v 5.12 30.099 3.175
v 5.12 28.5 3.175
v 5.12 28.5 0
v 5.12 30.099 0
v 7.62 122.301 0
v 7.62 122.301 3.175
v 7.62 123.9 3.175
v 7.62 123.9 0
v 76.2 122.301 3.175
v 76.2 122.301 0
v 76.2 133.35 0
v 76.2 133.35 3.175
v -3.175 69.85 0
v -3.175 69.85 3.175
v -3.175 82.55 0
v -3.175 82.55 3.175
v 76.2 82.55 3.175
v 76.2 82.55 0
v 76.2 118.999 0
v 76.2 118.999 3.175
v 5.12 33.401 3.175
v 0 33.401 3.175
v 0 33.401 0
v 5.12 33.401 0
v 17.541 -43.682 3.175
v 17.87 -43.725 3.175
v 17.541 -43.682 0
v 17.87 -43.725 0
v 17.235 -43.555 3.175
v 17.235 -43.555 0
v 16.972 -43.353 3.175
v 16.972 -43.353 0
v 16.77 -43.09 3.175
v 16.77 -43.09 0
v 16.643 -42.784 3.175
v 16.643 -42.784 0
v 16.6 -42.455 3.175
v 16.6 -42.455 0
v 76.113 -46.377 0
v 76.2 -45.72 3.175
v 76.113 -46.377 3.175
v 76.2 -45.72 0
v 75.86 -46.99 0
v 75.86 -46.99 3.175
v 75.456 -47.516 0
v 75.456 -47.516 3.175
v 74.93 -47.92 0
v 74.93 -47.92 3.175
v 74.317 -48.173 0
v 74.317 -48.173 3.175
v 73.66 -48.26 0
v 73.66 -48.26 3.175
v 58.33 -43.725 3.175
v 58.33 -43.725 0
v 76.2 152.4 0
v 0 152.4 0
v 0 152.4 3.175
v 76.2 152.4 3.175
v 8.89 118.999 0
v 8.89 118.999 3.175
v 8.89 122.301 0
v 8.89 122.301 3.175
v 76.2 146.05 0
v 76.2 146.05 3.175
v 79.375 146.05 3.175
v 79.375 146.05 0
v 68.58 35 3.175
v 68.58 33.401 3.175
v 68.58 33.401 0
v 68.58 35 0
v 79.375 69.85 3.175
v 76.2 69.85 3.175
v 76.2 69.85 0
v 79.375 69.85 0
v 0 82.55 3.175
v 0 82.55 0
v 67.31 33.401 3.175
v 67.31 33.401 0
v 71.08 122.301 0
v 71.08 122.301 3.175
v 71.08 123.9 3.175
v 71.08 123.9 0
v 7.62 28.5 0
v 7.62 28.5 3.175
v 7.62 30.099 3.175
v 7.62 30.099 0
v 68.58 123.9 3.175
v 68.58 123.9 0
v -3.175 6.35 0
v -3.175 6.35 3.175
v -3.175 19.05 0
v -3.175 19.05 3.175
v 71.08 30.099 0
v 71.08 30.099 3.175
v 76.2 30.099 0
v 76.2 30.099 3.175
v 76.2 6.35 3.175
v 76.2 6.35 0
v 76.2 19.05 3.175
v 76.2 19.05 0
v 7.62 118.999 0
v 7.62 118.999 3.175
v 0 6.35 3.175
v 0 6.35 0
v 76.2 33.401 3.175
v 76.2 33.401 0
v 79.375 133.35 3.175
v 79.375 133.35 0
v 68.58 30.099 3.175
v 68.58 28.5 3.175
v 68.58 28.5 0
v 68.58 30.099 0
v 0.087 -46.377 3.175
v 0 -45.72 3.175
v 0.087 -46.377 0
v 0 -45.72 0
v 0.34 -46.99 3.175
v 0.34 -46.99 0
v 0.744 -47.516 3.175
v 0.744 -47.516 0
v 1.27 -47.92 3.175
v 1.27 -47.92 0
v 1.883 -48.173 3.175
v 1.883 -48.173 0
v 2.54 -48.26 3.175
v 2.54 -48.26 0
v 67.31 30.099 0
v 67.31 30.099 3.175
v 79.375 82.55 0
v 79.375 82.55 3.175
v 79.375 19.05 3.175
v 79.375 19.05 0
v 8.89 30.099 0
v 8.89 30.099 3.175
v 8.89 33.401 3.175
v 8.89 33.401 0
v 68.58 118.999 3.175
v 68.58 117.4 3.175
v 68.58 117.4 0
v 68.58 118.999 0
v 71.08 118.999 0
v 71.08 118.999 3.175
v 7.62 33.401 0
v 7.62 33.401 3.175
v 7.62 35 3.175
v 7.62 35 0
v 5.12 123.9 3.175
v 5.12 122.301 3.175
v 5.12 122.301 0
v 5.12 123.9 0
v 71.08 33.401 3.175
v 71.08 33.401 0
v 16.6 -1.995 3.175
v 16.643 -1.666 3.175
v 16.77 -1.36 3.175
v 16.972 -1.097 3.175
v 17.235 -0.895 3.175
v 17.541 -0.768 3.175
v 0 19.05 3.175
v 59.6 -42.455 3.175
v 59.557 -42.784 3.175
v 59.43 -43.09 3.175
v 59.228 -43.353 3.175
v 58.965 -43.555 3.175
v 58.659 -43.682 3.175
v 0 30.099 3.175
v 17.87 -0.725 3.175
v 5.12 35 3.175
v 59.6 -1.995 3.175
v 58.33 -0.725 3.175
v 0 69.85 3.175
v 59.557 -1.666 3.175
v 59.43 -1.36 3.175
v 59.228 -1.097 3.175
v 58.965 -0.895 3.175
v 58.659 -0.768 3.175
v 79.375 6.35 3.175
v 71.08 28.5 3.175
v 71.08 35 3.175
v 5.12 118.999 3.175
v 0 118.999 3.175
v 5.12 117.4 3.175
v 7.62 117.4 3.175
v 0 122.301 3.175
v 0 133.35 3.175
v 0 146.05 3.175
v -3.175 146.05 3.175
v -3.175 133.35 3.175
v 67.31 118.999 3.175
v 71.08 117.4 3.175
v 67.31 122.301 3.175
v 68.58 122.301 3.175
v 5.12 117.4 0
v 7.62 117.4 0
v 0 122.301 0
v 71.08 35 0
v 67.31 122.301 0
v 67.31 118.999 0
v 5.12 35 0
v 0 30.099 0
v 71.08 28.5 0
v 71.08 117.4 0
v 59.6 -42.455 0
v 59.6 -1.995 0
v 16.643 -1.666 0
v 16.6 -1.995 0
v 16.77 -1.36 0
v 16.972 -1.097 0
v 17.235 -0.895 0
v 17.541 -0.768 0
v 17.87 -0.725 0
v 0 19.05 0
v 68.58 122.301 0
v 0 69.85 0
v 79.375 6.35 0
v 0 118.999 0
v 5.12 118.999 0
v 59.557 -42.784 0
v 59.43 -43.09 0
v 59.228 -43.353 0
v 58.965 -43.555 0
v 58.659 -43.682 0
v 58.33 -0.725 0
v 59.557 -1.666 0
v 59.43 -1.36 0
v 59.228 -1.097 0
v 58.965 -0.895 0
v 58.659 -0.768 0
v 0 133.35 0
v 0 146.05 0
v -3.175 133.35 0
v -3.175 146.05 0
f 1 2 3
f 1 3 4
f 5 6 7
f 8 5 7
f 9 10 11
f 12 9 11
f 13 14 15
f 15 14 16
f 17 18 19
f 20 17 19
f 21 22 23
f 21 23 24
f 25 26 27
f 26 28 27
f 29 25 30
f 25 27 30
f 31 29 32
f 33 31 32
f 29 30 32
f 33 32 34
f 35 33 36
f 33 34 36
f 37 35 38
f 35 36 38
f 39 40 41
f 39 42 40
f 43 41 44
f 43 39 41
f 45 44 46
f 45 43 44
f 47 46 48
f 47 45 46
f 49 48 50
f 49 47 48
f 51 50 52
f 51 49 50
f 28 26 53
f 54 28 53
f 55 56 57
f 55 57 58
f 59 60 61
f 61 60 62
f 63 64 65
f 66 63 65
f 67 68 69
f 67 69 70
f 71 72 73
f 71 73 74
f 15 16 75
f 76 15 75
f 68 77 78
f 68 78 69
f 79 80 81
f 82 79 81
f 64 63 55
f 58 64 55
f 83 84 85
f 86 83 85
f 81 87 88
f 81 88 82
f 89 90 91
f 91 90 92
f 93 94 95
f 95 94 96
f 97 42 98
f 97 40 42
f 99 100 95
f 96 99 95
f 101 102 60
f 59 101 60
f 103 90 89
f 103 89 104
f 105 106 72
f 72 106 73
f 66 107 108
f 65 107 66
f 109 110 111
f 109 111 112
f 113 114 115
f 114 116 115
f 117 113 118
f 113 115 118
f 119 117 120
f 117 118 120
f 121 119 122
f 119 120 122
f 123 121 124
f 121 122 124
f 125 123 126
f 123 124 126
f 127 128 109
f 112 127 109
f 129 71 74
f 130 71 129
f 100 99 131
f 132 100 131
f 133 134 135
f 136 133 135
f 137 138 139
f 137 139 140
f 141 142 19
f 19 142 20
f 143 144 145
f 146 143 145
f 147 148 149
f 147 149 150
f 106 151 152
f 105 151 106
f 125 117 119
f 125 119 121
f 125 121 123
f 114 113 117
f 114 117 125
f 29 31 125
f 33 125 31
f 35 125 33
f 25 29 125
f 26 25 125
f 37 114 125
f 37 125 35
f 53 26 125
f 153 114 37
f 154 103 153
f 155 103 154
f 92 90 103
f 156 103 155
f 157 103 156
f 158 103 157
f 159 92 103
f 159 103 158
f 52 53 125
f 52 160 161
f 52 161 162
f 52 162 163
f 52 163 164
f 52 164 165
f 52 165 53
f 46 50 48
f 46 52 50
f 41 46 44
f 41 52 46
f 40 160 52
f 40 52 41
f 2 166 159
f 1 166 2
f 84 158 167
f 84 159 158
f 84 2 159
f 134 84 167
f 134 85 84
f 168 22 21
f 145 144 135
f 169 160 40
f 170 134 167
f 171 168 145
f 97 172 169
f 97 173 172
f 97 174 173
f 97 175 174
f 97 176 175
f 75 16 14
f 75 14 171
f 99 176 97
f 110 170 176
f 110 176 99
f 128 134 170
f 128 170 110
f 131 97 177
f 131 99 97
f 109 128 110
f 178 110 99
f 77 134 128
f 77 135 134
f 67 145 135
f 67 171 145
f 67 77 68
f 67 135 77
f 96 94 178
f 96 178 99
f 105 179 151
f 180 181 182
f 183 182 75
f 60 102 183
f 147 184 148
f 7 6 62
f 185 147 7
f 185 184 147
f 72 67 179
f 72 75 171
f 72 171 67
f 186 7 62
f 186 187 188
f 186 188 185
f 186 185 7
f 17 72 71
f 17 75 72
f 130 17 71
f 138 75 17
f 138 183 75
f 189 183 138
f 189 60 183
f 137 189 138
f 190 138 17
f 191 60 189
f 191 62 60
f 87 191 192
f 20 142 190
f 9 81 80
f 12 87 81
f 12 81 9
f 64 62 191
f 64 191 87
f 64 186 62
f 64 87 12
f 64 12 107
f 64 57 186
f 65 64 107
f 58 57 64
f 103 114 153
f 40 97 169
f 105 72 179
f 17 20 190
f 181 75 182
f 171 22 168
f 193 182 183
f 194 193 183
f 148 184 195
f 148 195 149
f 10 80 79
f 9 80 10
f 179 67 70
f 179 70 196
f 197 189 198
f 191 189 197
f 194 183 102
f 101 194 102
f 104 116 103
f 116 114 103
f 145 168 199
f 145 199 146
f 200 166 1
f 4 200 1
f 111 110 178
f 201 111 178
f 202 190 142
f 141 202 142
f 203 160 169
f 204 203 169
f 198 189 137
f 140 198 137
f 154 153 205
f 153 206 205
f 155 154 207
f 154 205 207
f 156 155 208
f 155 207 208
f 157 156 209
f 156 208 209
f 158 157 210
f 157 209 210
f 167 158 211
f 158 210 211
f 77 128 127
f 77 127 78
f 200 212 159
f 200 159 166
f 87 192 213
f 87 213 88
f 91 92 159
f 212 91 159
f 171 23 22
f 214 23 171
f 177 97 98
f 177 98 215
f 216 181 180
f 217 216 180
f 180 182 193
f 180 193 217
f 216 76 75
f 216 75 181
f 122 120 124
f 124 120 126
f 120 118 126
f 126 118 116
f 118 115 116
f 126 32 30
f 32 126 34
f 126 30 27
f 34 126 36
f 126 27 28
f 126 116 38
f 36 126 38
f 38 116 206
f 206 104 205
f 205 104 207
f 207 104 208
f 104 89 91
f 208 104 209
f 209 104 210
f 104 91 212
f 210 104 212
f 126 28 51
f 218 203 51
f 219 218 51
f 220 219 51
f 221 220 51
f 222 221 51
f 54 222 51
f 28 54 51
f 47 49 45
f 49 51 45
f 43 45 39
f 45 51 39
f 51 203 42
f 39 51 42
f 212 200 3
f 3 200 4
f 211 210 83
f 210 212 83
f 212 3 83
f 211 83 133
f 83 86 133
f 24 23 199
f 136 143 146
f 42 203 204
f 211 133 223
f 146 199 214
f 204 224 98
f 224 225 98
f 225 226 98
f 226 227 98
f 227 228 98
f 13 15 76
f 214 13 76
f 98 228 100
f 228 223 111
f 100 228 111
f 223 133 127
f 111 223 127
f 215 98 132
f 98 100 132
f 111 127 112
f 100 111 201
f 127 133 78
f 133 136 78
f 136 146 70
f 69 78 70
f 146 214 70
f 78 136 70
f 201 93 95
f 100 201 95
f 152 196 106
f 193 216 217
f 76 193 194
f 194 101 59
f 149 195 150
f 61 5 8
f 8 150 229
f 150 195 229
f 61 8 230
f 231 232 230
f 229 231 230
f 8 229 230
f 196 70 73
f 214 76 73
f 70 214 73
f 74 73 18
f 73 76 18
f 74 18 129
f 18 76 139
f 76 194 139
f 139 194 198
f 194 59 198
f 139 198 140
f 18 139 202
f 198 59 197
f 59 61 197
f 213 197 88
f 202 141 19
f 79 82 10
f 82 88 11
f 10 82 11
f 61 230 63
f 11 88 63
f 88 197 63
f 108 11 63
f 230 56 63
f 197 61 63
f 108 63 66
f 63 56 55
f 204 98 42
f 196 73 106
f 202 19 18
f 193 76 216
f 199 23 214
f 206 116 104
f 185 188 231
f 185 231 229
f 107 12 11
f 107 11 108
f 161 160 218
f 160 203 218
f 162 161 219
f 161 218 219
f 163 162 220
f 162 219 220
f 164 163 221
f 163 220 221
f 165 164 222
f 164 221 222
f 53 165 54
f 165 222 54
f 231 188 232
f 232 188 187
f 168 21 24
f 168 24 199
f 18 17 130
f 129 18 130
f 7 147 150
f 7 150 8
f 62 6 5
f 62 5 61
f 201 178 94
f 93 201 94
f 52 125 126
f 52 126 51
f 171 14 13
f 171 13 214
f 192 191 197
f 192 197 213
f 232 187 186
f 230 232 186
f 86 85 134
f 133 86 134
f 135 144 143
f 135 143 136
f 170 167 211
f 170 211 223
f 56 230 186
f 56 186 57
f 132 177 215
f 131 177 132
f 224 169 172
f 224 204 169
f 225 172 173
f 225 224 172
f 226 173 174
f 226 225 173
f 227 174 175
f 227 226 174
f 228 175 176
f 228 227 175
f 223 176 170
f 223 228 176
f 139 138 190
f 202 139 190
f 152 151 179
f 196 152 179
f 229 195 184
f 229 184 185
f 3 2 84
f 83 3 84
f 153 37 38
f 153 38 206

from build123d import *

# Parameters (mm, degrees)
SKETCH1_W           = 76.2
SKETCH1_H           = 152.4
BOSS_EXTRUDE1_DEPTH = 3.175
SKETCH2_W           = 3.175
SKETCH2_H           = 12.7
BOSS_EXTRUDE3_DEPTH = 3.175
SKETCH4_W           = 8.89
SKETCH4_H           = 3.302
SKETCH4_W_2         = 2.5
SKETCH4_H_2         = 6.5
CUT_EXTRUDE4_DEPTH  = 3.175
SKETCH5_W           = 76.2
SKETCH5_H           = 44.45
SKETCH5_W_2         = 43
SKETCH5_H_2         = 43
BOSS_EXTRUDE4_DEPTH = 3.175
SKETCH7_W           = 76.2
SKETCH7_H           = 3.81
BOSS_EXTRUDE5_DEPTH = 3.175
FILLET1_R           = 2.54
FILLET2_R           = 1.27


with BuildPart() as part:
    # Sketch1 → Boss-Extrude1 (new body)
    with BuildSketch(Plane.XY):
        with Locations((38.1, 76.2)):
            Rectangle(SKETCH1_W, SKETCH1_H)
    extrude(amount=BOSS_EXTRUDE1_DEPTH)

    # Sketch2 → Boss-Extrude3 (add)
    with BuildSketch(Plane.XY.offset(3.175)):
        with Locations((-1.5875, 76.2)):
            Rectangle(SKETCH2_W, SKETCH2_H)
        with Locations((77.7875, 139.7)):
            Rectangle(SKETCH2_W, SKETCH2_H)
        with Locations((77.7875, 76.2)):
            Rectangle(SKETCH2_W, SKETCH2_H)
        with Locations((77.7875, 12.7)):
            Rectangle(SKETCH2_W, SKETCH2_H)
        with Locations((-1.5875, 12.7)):
            Rectangle(SKETCH2_W, SKETCH2_H)
        with Locations((-1.5875, 139.7)):
            Rectangle(SKETCH2_W, SKETCH2_H)
    extrude(amount=-BOSS_EXTRUDE3_DEPTH)

    # Sketch4 → Cut-Extrude4 (cut)
    with BuildSketch(Plane.XY.offset(3.175)):
        with Locations((4.445, 120.65)):
            Rectangle(SKETCH4_W, SKETCH4_H)
        with Locations((6.37, 120.65)):
            Rectangle(SKETCH4_W_2, SKETCH4_H_2)
        with Locations((6.37, 31.75)):
            Rectangle(SKETCH4_W_2, SKETCH4_H_2)
        with Locations((4.445, 31.75)):
            Rectangle(SKETCH4_W, SKETCH4_H)
        with Locations((71.755, 31.75)):
            Rectangle(SKETCH4_W, SKETCH4_H)
        with Locations((69.83, 31.75)):
            Rectangle(SKETCH4_W_2, SKETCH4_H_2)
        with Locations((69.83, 120.65)):
            Rectangle(SKETCH4_W_2, SKETCH4_H_2)
        with Locations((71.755, 120.65)):
            Rectangle(SKETCH4_W, SKETCH4_H)
    extrude(amount=-CUT_EXTRUDE4_DEPTH, mode=Mode.SUBTRACT)

    # Sketch5 → Boss-Extrude4 (add)
    with BuildSketch(Plane.XY.offset(3.175)):
        with Locations((38.1, -22.225)):
            Rectangle(SKETCH5_W, SKETCH5_H)
        with Locations((38.1, -22.225)):
            Rectangle(SKETCH5_W_2, SKETCH5_H_2, mode=Mode.SUBTRACT)
    extrude(amount=-BOSS_EXTRUDE4_DEPTH)

    # Sketch7 → Boss-Extrude5 (add)
    with BuildSketch(Plane.XY.offset(3.175)):
        with Locations((38.1, -46.355)):
            Rectangle(SKETCH7_W, SKETCH7_H)
    extrude(amount=-BOSS_EXTRUDE5_DEPTH)

    # Fillet1
    fillet1_edges = [part.edges().sort_by_distance(p)[0] for p in [
        (76.2, -48.26, 1.5875),
        (0, -48.26, 1.5875),
    ]]
    fillet(fillet1_edges, radius=FILLET1_R)

    # Fillet2
    fillet2_edges = [part.edges().sort_by_distance(p)[0] for p in [
        (59.6, -43.725, 1.5875),
        (16.6, -43.725, 1.5875),
        (16.6, -0.725, 1.5875),
        (59.6, -0.725, 1.5875),
    ]]
    fillet(fillet2_edges, radius=FILLET2_R)


solid = part.part
